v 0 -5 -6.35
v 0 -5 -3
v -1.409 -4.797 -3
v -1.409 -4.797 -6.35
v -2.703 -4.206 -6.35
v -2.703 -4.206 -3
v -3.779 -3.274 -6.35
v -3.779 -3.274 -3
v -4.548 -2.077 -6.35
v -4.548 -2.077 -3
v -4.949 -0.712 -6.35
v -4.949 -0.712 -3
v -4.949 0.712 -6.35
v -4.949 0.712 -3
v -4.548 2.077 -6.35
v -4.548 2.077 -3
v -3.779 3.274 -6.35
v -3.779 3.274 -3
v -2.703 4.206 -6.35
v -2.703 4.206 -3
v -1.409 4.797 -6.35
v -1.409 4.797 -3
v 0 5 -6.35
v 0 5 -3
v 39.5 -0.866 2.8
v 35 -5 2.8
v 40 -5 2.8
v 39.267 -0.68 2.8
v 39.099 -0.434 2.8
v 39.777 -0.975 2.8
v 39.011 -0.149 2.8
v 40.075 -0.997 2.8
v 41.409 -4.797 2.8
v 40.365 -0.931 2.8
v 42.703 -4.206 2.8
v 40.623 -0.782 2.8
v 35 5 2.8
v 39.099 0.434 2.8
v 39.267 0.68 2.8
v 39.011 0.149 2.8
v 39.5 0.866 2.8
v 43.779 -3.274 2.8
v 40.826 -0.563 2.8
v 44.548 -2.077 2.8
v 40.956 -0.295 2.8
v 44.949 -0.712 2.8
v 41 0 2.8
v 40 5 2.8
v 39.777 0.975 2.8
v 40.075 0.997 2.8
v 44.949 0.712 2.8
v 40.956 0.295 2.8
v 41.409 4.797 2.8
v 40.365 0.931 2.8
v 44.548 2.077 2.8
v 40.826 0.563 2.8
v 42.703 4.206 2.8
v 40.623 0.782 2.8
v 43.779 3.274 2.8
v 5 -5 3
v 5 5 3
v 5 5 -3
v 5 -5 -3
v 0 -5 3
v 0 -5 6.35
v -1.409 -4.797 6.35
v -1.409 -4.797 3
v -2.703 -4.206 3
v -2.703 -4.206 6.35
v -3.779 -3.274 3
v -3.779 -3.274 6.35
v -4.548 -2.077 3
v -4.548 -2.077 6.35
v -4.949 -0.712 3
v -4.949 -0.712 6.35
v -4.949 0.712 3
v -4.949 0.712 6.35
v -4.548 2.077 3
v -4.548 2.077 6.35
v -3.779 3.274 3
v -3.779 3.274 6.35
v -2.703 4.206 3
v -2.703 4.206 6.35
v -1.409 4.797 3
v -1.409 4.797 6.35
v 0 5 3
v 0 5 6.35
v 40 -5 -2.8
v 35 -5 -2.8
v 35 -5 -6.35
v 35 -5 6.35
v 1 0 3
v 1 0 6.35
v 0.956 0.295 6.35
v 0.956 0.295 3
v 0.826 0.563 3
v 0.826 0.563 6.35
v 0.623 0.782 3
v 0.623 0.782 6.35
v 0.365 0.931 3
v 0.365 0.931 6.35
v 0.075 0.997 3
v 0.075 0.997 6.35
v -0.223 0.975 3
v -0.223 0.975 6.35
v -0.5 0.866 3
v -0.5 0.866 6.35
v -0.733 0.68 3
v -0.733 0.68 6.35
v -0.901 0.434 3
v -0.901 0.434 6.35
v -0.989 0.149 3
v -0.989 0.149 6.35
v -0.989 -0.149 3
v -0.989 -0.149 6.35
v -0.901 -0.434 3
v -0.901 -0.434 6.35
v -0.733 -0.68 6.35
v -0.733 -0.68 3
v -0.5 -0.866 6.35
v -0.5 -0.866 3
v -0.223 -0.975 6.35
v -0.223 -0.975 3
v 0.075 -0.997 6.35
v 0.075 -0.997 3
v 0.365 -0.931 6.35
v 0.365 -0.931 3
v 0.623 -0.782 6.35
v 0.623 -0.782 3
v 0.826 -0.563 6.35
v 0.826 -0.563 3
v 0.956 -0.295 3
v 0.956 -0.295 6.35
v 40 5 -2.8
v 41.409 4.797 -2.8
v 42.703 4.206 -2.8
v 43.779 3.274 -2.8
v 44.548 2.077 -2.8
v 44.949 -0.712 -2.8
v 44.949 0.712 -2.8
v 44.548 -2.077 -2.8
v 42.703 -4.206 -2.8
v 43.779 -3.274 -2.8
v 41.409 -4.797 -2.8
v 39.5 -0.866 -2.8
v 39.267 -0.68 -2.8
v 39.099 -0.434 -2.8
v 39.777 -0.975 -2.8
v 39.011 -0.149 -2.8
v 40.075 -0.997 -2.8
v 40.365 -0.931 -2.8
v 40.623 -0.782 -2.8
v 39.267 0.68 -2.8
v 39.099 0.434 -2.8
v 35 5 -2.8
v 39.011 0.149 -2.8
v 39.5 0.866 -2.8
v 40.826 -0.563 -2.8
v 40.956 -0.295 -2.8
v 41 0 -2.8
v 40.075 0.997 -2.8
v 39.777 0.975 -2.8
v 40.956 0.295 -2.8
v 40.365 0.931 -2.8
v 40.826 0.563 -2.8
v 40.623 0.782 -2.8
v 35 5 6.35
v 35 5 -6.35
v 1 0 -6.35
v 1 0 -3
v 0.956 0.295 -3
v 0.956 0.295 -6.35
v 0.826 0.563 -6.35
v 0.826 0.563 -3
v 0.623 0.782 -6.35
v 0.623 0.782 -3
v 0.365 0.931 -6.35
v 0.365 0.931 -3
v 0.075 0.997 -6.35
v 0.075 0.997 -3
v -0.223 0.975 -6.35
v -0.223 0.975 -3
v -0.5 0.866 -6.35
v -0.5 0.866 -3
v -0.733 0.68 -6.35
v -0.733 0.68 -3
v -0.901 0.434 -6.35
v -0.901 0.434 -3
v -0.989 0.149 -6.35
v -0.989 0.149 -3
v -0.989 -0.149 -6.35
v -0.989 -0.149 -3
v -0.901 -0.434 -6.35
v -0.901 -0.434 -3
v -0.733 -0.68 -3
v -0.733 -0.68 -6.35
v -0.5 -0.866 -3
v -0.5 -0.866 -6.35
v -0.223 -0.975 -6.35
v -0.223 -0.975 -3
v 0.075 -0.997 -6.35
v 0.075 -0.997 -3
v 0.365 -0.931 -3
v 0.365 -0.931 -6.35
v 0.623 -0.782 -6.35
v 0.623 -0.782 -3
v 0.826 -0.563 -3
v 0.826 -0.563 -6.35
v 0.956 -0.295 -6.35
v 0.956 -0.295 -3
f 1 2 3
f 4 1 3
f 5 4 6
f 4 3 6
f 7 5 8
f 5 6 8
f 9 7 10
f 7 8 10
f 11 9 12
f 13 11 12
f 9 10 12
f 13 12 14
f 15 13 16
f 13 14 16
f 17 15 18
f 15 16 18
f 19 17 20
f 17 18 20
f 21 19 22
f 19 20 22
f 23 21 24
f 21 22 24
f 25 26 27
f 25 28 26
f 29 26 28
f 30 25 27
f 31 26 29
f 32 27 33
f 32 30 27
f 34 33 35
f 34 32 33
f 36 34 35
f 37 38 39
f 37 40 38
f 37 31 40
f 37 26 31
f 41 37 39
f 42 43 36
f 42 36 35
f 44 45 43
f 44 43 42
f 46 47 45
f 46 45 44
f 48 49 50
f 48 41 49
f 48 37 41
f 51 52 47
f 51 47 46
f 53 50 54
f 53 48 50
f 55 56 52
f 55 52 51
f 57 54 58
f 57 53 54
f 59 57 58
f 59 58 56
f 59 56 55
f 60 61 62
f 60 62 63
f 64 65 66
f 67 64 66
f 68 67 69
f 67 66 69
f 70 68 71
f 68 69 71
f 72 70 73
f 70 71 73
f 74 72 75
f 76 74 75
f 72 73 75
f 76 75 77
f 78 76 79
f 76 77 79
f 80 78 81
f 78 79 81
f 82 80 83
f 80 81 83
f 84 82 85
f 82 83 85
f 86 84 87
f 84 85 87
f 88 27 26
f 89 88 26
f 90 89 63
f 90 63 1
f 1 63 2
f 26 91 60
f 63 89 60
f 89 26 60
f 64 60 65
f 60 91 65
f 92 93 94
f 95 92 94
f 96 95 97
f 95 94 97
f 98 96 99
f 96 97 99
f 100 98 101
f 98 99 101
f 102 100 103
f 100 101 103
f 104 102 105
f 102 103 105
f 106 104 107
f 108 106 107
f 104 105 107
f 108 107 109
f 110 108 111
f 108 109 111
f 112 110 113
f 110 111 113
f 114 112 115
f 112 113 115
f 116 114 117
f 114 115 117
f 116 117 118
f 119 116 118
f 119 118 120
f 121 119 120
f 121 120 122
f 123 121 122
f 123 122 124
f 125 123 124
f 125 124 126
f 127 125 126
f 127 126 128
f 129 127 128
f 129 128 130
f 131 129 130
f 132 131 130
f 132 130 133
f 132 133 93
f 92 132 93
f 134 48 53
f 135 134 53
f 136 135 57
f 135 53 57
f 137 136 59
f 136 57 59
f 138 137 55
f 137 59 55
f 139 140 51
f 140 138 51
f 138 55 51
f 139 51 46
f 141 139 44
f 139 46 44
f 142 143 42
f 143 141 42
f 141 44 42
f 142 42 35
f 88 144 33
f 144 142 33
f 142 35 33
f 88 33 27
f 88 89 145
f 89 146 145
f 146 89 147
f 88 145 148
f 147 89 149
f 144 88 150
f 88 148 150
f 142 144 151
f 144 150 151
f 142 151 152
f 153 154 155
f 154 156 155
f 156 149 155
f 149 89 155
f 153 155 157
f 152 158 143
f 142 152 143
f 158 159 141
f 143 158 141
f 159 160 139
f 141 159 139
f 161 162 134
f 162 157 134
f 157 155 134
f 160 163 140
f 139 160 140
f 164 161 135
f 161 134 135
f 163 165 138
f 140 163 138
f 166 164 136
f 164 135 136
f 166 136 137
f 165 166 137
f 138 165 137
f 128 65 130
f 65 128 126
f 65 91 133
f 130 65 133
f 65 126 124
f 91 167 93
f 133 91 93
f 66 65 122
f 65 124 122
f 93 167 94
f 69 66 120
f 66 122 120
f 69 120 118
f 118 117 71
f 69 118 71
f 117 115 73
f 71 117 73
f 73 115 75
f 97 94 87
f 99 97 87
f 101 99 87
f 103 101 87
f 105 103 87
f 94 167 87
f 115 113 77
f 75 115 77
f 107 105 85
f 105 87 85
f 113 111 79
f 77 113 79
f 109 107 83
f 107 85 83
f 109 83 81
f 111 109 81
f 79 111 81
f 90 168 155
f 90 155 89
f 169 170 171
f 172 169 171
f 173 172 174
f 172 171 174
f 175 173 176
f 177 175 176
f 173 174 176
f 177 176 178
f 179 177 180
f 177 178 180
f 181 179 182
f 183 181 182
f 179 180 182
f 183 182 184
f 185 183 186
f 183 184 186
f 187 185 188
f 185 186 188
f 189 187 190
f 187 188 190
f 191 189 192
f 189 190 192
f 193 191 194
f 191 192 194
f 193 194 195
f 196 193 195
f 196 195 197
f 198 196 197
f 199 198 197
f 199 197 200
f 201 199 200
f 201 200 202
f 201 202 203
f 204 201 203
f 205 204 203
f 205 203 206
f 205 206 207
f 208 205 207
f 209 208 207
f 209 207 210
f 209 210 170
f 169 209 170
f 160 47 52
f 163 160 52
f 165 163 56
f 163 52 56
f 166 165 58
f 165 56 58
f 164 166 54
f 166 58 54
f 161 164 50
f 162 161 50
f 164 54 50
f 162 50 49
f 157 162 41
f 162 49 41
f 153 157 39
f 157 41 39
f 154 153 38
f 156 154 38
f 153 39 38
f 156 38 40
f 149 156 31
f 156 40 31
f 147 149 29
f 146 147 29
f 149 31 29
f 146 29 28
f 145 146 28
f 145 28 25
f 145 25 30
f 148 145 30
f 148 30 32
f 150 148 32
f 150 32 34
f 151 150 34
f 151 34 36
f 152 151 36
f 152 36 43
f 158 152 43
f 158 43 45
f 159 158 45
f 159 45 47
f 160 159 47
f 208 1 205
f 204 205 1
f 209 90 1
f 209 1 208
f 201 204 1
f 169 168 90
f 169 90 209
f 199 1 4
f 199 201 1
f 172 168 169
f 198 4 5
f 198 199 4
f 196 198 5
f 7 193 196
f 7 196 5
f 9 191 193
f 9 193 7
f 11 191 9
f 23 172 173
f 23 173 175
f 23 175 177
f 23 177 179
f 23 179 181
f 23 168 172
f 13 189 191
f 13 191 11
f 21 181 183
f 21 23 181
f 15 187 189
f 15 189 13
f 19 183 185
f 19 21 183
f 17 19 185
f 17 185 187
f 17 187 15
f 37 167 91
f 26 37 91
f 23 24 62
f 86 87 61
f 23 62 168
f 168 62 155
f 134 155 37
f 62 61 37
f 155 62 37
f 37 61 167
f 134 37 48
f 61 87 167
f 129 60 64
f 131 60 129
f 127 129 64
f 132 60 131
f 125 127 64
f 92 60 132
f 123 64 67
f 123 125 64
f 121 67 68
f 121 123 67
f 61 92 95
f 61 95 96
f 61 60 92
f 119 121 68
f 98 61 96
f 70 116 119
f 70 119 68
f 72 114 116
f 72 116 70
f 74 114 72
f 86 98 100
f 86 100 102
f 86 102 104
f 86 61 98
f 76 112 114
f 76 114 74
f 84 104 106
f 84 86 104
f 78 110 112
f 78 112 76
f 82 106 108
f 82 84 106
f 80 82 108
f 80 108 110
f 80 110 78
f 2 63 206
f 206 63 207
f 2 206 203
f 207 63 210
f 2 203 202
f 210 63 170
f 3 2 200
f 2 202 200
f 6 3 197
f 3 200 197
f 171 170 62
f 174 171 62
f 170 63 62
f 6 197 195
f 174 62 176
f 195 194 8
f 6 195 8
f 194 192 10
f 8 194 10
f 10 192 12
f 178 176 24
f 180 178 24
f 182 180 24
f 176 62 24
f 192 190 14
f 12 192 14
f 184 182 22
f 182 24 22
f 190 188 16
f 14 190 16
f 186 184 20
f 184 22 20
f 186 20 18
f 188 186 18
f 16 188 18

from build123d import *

# Parameters (mm, degrees)
BOSS_EXTRUDE1_DEPTH = 6.35
SKETCH2_R           = 1
CUT_EXTRUDE1_DEPTH  = 12.7
CUT_EXTRUDE2_DEPTH  = 3.55
CUT_EXTRUDE3_START  = -6.35
CUT_EXTRUDE3_DEPTH  = 3


with BuildPart() as part:
    # Sketch1 → Boss-Extrude1 (new, symmetric)
    with BuildSketch(Plane.XY):
        with BuildLine():
            Line((0, 5), (40, 5))
            ThreePointArc((40, 5), (45, 0), (40, -5))
            Line((40, -5), (0, -5))
            ThreePointArc((0, -5), (-5, 0), (0, 5))
        make_face()
    extrude(amount=BOSS_EXTRUDE1_DEPTH, both=True)

    # Sketch2 → Cut-Extrude1 (cut)
    with BuildSketch(Plane.XY.offset(6.35)):
        with Locations((40, 0)):
            Circle(SKETCH2_R)
        Circle(SKETCH2_R)
    extrude(amount=-CUT_EXTRUDE1_DEPTH, mode=Mode.SUBTRACT)

    # Sketch3 → Cut-Extrude2 (cut)
    with BuildSketch(Plane.XY.offset(6.35)):
        with BuildLine():
            Line((35, 5), (35, -5))
            Line((35, -5), (40, -5))
            ThreePointArc((40, -5), (45, 0), (40, 5))
            Line((40, 5), (35, 5))
        make_face()
    cut_extrude2 = extrude(amount=-CUT_EXTRUDE2_DEPTH, mode=Mode.SUBTRACT)

    # Mirror1: Cut-Extrude2 across plane
    add(cut_extrude2.mirror(Plane.XY), mode=Mode.SUBTRACT)

    # Sketch4 → Cut-Extrude3 (cut, symmetric)
    with BuildSketch(Plane.XY.offset(6.35).offset(CUT_EXTRUDE3_START)):
        with BuildLine():
            Line((5, 5), (5, -5))
            Line((5, -5), (0, -5))
            ThreePointArc((0, -5), (-5, 0), (0, 5))
            Line((0, 5), (5, 5))
        make_face()
    extrude(amount=CUT_EXTRUDE3_DEPTH, both=True, mode=Mode.SUBTRACT)


solid = part.part
